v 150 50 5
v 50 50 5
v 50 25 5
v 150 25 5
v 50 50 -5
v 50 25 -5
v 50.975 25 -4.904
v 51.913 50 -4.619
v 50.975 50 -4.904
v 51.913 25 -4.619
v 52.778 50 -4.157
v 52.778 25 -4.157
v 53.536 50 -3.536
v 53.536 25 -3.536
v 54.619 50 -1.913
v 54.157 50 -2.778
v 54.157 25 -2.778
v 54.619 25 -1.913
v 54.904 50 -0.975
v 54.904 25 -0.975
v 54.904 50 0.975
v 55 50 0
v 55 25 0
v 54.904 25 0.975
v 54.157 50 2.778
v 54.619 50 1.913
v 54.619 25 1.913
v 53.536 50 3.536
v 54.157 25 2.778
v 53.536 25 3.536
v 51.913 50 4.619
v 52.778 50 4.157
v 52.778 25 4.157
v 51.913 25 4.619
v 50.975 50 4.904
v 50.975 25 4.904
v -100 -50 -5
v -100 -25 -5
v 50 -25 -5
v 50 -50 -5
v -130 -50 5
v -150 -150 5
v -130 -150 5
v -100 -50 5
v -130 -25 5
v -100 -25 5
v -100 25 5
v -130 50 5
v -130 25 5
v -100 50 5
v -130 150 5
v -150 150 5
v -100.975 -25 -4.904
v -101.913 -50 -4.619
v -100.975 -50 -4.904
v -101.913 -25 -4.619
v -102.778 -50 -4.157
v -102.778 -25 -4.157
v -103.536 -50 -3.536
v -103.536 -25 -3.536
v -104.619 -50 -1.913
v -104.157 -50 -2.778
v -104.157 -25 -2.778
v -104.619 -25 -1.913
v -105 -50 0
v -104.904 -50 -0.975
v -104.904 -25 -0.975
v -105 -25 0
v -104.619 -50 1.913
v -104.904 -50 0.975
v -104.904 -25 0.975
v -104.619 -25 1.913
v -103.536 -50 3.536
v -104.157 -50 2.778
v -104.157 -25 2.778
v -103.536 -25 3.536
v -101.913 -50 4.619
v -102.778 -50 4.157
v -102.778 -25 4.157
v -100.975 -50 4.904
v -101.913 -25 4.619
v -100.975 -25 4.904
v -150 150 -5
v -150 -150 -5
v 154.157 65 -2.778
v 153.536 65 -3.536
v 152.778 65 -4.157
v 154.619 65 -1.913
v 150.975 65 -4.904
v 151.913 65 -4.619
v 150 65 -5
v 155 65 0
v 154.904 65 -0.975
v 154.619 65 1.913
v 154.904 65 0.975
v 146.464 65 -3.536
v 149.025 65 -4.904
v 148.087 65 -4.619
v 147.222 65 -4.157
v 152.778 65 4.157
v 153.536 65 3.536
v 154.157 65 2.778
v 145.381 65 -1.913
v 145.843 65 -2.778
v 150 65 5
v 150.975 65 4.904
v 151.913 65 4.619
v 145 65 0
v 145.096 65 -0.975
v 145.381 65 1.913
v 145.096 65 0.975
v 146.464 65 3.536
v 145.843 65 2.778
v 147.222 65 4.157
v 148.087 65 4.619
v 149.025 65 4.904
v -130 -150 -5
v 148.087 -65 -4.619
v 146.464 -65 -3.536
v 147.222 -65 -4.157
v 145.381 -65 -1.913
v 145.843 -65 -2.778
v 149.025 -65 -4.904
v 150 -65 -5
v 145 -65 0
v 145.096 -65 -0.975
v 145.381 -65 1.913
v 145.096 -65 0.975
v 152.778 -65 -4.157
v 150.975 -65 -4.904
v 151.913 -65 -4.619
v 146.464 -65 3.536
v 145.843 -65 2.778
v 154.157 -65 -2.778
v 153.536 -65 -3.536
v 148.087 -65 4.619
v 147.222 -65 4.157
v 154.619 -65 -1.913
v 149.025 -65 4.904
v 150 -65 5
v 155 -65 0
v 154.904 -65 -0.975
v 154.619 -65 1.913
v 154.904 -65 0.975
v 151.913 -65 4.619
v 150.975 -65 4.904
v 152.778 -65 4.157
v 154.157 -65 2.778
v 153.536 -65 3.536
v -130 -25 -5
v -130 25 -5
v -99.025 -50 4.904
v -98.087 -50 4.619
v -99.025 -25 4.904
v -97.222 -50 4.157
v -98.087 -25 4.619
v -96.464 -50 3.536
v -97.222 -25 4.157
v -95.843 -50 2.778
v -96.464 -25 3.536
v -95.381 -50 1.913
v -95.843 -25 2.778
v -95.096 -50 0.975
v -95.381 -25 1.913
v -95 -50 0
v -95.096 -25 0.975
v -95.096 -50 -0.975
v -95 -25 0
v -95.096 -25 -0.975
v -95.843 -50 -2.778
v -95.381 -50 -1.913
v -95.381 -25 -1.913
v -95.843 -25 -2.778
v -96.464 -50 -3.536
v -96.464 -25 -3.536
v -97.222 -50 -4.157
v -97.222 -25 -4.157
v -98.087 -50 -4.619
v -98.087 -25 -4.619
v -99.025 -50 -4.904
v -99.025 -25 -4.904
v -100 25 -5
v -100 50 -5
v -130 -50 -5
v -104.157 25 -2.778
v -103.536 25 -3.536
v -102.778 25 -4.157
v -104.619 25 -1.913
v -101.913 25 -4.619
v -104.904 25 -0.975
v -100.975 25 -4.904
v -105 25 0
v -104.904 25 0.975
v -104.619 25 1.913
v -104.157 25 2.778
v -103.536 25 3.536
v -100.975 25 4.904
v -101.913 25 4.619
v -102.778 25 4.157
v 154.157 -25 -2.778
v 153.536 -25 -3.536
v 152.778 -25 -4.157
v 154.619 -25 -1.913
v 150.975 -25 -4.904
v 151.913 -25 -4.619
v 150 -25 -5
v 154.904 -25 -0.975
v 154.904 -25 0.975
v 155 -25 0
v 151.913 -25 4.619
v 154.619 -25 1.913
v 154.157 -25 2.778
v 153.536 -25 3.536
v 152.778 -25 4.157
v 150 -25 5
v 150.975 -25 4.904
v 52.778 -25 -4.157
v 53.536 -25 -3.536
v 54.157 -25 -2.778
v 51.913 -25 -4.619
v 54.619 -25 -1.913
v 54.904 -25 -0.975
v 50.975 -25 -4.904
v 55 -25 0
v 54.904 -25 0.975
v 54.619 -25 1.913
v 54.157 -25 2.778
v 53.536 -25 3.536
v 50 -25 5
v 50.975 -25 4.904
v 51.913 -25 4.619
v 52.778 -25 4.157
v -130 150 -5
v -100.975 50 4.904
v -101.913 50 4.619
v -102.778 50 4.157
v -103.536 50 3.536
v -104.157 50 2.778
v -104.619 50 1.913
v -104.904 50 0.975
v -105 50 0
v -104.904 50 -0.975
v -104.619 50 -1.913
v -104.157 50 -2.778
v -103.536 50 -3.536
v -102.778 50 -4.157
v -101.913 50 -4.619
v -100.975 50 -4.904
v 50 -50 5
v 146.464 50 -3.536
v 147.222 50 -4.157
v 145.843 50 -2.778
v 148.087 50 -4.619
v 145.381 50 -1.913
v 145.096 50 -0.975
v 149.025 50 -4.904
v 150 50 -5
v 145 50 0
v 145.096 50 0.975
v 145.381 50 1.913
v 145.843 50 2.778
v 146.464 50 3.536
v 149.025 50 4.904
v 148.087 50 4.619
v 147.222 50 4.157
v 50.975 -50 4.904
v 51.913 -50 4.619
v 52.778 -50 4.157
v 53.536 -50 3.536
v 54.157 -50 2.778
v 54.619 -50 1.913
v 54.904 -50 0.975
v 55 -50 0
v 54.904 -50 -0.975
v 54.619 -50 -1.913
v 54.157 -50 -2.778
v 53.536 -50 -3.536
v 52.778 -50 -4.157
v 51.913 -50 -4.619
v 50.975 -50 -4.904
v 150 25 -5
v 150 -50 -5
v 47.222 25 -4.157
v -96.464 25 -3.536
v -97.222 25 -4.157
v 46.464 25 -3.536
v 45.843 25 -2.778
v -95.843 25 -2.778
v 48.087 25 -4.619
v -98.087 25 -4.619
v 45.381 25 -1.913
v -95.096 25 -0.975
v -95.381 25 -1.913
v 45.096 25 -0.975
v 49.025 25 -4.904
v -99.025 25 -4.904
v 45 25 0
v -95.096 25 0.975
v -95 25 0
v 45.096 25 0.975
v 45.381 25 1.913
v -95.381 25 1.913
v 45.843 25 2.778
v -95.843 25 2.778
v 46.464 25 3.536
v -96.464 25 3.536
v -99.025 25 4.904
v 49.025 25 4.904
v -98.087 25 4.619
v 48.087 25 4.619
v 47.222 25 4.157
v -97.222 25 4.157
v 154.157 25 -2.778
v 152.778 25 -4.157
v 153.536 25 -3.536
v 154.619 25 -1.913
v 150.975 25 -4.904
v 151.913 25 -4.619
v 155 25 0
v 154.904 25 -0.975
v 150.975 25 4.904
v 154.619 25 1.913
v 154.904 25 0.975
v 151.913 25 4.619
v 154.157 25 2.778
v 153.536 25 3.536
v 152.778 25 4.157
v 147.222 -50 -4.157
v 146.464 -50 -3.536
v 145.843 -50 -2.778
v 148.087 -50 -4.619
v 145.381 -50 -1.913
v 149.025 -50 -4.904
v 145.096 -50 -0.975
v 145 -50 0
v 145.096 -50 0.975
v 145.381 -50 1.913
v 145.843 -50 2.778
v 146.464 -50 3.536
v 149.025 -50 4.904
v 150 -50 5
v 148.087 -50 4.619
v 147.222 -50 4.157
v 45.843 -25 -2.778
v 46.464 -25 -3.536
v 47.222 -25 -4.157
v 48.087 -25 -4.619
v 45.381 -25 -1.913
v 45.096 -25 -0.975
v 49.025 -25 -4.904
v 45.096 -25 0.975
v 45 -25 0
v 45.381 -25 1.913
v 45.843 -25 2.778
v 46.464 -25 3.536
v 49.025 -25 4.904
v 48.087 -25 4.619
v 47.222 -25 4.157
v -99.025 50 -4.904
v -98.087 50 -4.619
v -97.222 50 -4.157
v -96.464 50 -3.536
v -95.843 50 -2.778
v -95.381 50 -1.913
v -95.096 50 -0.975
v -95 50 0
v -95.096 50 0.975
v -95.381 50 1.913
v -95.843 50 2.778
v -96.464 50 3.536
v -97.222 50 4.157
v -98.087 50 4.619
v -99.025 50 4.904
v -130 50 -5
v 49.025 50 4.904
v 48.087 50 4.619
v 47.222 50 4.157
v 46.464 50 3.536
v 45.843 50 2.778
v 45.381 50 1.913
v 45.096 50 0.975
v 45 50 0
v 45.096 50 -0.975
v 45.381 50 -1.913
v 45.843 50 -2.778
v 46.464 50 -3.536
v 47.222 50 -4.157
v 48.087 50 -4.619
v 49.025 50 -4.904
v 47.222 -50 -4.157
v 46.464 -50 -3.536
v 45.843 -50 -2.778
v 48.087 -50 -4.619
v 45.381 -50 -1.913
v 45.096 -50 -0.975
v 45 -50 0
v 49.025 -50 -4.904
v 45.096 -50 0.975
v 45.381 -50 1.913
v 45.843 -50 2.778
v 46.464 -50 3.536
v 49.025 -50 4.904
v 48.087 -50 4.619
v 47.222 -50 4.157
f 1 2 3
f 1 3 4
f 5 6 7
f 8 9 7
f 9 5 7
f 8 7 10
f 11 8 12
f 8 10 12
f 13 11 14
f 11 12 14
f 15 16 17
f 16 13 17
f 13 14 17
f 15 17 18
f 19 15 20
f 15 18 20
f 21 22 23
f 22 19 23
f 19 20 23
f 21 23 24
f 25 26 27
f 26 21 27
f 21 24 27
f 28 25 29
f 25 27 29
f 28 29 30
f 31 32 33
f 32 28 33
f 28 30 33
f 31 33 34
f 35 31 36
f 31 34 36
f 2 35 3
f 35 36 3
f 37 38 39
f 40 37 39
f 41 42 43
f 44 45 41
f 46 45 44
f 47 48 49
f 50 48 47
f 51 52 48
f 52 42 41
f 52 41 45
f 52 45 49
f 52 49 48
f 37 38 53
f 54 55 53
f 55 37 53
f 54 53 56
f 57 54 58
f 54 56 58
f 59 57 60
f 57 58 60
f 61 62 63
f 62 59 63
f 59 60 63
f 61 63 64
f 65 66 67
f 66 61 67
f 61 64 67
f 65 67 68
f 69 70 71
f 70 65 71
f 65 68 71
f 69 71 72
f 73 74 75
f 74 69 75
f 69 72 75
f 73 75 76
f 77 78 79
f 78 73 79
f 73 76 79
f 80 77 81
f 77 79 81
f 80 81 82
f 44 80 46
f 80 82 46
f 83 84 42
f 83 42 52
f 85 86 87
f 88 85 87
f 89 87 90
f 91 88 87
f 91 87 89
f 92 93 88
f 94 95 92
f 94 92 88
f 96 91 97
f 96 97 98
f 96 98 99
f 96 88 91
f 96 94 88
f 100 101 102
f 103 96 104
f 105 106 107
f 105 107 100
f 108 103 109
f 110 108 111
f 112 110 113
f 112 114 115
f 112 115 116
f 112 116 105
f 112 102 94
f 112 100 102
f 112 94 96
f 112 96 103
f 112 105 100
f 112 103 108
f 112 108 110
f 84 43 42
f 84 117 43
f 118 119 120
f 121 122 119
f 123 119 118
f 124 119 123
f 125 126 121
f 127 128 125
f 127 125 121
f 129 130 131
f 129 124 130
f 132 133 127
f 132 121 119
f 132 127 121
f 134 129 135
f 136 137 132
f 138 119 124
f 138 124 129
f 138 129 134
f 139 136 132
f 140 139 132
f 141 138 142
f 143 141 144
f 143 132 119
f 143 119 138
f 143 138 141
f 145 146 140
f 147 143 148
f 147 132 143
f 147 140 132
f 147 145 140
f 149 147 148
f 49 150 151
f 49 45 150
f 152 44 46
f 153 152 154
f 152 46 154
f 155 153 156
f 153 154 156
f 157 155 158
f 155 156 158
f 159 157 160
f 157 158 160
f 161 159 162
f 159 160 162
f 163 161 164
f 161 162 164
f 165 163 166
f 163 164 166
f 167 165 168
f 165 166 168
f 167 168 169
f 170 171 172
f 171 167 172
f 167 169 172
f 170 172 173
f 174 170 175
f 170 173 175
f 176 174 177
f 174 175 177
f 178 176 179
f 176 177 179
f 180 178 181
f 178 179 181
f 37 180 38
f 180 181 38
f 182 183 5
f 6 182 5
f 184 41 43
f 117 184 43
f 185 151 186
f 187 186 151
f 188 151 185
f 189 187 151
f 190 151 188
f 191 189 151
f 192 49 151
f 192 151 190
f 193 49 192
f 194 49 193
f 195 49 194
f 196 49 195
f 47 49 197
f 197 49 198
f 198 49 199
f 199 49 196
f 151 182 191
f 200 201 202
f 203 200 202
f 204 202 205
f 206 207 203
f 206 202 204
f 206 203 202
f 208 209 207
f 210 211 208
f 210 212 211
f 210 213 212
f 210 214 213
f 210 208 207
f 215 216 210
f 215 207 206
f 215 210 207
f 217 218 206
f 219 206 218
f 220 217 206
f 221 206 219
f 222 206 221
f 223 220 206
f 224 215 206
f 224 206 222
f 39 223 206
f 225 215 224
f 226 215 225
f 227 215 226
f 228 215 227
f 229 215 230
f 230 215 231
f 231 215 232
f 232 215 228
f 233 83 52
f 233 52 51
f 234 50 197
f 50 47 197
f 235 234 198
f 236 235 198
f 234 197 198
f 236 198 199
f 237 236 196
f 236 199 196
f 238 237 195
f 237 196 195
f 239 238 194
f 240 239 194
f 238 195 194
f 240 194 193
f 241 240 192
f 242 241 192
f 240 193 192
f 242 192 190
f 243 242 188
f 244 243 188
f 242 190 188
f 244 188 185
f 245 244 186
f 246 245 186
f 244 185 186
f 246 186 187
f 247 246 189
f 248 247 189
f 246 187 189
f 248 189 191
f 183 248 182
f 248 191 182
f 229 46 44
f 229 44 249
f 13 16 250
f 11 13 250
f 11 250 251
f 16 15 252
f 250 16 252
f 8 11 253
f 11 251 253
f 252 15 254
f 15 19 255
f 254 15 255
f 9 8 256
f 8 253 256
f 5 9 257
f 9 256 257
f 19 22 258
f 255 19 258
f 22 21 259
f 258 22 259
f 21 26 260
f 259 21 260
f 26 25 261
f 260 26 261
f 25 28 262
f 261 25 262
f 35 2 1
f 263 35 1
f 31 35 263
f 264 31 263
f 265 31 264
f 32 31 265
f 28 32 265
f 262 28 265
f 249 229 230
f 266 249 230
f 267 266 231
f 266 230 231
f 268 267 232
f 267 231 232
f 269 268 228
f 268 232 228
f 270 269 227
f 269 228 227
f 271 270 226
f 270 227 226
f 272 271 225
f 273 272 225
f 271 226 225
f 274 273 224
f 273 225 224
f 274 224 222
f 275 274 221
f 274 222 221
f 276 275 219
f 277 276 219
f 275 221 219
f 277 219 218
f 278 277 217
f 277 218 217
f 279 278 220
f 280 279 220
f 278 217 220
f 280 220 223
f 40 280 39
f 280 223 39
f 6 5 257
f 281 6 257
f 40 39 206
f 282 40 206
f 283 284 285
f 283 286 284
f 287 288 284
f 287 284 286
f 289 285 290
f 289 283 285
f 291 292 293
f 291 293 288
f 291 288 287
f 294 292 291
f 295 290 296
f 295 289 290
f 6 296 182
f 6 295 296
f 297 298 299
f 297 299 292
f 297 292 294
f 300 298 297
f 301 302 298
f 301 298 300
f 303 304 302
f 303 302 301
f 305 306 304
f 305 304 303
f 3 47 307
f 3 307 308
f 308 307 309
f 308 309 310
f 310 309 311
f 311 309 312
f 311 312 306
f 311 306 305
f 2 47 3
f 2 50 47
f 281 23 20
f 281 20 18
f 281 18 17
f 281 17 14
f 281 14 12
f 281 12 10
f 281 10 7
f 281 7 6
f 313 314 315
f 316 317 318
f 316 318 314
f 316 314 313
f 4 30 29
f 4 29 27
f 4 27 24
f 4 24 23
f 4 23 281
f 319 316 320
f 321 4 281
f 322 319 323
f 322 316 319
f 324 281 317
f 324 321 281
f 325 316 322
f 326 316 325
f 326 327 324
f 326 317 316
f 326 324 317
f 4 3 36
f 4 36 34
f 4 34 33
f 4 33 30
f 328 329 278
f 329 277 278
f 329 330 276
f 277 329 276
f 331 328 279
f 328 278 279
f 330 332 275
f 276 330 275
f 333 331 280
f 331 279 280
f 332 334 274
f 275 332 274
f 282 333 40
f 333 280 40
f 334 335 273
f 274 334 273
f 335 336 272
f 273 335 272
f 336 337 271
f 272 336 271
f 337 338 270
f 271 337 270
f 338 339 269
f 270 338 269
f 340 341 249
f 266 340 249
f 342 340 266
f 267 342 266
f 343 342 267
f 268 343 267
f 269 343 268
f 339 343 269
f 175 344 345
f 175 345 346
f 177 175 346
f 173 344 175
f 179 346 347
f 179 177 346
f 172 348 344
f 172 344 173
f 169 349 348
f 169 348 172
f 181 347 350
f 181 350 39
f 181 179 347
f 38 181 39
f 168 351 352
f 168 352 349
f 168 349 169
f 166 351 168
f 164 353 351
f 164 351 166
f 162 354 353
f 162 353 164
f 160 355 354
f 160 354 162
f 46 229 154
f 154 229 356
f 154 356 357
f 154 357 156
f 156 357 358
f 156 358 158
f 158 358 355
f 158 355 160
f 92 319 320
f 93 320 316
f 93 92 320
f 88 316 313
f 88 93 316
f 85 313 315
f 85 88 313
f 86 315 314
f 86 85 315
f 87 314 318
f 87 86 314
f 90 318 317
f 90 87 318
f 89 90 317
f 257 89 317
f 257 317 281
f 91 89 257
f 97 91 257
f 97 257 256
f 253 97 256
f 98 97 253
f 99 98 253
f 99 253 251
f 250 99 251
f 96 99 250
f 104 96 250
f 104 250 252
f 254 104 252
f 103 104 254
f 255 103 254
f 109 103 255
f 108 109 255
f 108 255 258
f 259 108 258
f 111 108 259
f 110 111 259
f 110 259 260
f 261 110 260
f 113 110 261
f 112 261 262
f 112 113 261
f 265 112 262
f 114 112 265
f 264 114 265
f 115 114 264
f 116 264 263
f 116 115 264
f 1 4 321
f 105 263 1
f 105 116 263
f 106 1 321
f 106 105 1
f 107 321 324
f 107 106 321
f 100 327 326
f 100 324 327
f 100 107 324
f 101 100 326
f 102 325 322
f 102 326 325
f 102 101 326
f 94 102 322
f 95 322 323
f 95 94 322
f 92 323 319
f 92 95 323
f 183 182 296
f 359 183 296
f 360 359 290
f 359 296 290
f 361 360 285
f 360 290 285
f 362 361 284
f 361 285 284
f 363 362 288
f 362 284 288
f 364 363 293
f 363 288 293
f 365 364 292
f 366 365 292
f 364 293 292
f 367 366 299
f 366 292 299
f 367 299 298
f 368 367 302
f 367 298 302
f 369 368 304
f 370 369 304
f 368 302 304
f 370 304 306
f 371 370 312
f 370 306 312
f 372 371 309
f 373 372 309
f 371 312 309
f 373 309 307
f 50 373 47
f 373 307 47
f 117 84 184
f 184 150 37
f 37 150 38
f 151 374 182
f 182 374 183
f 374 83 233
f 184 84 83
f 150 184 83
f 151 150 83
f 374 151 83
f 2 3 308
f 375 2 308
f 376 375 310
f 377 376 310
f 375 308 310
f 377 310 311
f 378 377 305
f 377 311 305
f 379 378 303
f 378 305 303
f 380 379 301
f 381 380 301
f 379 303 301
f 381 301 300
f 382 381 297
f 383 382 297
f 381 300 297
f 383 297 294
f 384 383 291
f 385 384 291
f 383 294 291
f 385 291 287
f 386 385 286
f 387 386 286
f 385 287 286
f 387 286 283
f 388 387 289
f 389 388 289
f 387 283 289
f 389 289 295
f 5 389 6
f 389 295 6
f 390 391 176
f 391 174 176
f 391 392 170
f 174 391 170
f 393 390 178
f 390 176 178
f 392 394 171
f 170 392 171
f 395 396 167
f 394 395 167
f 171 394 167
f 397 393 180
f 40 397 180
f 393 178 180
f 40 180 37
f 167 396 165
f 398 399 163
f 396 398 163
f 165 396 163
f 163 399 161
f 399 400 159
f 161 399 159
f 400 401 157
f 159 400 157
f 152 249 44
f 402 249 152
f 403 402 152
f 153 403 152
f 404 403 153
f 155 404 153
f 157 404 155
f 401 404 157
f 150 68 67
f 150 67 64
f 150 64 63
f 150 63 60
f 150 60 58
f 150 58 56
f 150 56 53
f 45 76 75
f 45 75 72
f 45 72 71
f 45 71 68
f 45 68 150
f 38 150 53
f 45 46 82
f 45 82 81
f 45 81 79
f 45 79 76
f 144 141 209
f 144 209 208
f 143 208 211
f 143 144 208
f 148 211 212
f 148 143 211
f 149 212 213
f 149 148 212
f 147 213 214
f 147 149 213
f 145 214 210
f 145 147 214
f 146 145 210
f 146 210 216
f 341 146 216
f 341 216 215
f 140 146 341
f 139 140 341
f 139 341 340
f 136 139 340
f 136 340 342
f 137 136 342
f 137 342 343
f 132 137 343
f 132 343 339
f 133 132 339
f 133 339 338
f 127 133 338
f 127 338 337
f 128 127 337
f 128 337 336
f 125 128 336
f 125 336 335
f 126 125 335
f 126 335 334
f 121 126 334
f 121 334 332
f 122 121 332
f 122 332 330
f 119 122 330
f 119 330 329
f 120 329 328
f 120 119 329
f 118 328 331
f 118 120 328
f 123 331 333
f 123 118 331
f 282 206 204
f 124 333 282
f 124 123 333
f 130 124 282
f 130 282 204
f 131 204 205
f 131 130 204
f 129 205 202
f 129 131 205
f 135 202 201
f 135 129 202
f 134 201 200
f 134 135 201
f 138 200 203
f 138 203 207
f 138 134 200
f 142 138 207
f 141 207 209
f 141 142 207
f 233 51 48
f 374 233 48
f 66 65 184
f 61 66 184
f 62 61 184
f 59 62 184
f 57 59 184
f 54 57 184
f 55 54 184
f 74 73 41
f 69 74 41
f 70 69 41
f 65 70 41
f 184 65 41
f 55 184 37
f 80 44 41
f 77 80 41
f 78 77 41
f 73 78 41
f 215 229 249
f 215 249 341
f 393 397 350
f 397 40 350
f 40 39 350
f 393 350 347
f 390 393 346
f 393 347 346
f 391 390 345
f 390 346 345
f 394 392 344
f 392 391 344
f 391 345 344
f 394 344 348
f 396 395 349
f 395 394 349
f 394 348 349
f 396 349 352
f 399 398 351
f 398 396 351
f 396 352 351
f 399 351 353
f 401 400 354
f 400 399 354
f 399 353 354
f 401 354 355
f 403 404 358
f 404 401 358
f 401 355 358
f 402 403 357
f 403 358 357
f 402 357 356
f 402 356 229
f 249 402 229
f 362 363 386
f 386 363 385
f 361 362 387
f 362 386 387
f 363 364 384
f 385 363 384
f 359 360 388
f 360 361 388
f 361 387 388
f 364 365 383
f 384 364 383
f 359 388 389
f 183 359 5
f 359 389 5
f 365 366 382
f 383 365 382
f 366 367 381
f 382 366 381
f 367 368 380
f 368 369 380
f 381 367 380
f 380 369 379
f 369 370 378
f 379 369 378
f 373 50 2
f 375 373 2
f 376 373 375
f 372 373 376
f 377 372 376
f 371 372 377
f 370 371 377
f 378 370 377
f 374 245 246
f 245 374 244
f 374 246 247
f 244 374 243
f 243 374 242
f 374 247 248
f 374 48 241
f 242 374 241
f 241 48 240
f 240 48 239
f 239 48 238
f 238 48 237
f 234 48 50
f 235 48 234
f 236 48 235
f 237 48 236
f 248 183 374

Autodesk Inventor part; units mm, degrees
ref_plane "YZ Plane" through (0, 0, 0) normal (1, 0, 0) x (0, 1, 0)
ref_plane "XZ Plane" through (0, 0, 0) normal (0, 1, 0) x (-1, 0, 0)
ref_plane "XY Plane" through (0, 0, 0) normal (0, 0, 1) x (1, 0, 0)
sketch "Sketch1" plane through (0, 0, 0) normal (0, 0, 1) x (1, 0, 0)
  line L0 (-150, 150) -> (150, 150)
  line L1 (150, 150) -> (150, -150)
  line L2 (150, -150) -> (-150, -150)
  line L3 (-150, -150) -> (-150, 150)
  point P0 (0, 0)
  dimension "d0" = 300
  dimension "d1" = 300
  dimension "d2" = 150
  dimension "d3" = 150
extrude "Extrusion1" add sketch "Sketch1" along normal mid plane 10
sketch "Sketch2" plane through (0, 0, 5) normal (0, 0, 1) x (1, 0, 0)
  line L0 (-130, 25) -> (323.6487, 25)
  line L1 (323.6487, 25) -> (323.6487, -25)
  line L2 (323.6487, -25) -> (-130, -25)
  line L3 (-130, -25) -> (-130, 25)
  point P0 (0, 0)
  dimension "d6" = 50
  dimension "d7" = 25
  dimension "d8" = 130
extrude "Extrusion2" cut sketch "Sketch2" against normal blind 10
sketch "Sketch3" plane through (0, 0, 5) normal (0, 0, 1) x (1, 0, 0)
  line L0 (170, -50) -> (-130, -50)
  line L1 (-130, -50) -> (-130, -158.2485)
  line L2 (-130, -158.2485) -> (170, -158.2485)
  line L3 (170, -158.2485) -> (170, -50)
  line L4 (150, -25) -> (-130, -25) projected
  point P0 (0, 0)
  dimension "d11" = 300
  dimension "d12" = 130
  dimension "d13" = 25
extrude "Extrusion3" cut sketch "Sketch3" against normal blind 10
mirror "Mirror1" about plane through (0, 0, 0) normal (0, 1, 0) of "Extrusion3"
sketch "Sketch4" plane through (-130, -50, 5) normal (0, -1, 0) x (1, 0, 0)
  point P0 (130, -5)
sketch "Sketch5" plane through (-130, -50, 5) normal (0, -1, 0) x (1, 0, 0)
  point P0 (130, -5)
sketch "Sketch6" plane through (-130, -50, 5) normal (0, -1, 0) x (1, 0, 0)
  point P0 (130, -5)
sketch "Sketch7" plane through (-130, 25, 5) normal (0, -1, 0) x (1, 0, 0)
  circle A0 centre (30, -5) radius 5
  line L0 (0, -10) -> (280, -10) projected
  point P0 (130, -5)
  dimension "d16" = 100
  dimension "d17" = 10
extrude "Extrusion4" cut sketch "Sketch7" against normal up to surface (25 mm away)
mirror "Mirror2" about plane through (0, 0, 0) normal (0, 1, 0) of "Extrusion4"
sketch "Sketch8" plane through (-130, -50, 5) normal (0, -1, 0) x (1, 0, 0)
  line L0 (280, 0) -> (280, -10) projected
  circle A0 centre (280, -5) radius 5
  line L1 (0, 0) -> (280, 0) projected
  point P0 (130, -5)
extrude "Extrusion5" add sketch "Sketch8" along normal blind 15
sketch "Sketch9" plane through (-130, -50, 5) normal (0, 1, 0) x (1, 0, 0)
  line L0 (280, 10) -> (280, 0) projected
  circle A0 centre (280, 5) radius 5
  point P0 (130, 5)
extrude "Extrusion6" add sketch "Sketch9" along normal up to surface (25 mm away)
mirror "Mirror3" about plane through (0, 0, 0) normal (0, 1, 0) of "Extrusion5", "Extrusion6"
sketch "Sketch10" plane through (-100, 25, 0) normal (0, -1, 0) x (1, 0, 0)
  circle A0 centre (150, 0) radius 5
  line L0 (0, 5) -> (250, 5) projected
  point P0 (100, 0)
  dimension "d24" = 50
extrude "Extrusion7" cut sketch "Sketch10" against normal up to surface (25 mm away)
mirror "Mirror4" about plane through (0, 0, 0) normal (0, 1, 0) of "Extrusion7"
properties part number "base" material "Stainless Steel"
